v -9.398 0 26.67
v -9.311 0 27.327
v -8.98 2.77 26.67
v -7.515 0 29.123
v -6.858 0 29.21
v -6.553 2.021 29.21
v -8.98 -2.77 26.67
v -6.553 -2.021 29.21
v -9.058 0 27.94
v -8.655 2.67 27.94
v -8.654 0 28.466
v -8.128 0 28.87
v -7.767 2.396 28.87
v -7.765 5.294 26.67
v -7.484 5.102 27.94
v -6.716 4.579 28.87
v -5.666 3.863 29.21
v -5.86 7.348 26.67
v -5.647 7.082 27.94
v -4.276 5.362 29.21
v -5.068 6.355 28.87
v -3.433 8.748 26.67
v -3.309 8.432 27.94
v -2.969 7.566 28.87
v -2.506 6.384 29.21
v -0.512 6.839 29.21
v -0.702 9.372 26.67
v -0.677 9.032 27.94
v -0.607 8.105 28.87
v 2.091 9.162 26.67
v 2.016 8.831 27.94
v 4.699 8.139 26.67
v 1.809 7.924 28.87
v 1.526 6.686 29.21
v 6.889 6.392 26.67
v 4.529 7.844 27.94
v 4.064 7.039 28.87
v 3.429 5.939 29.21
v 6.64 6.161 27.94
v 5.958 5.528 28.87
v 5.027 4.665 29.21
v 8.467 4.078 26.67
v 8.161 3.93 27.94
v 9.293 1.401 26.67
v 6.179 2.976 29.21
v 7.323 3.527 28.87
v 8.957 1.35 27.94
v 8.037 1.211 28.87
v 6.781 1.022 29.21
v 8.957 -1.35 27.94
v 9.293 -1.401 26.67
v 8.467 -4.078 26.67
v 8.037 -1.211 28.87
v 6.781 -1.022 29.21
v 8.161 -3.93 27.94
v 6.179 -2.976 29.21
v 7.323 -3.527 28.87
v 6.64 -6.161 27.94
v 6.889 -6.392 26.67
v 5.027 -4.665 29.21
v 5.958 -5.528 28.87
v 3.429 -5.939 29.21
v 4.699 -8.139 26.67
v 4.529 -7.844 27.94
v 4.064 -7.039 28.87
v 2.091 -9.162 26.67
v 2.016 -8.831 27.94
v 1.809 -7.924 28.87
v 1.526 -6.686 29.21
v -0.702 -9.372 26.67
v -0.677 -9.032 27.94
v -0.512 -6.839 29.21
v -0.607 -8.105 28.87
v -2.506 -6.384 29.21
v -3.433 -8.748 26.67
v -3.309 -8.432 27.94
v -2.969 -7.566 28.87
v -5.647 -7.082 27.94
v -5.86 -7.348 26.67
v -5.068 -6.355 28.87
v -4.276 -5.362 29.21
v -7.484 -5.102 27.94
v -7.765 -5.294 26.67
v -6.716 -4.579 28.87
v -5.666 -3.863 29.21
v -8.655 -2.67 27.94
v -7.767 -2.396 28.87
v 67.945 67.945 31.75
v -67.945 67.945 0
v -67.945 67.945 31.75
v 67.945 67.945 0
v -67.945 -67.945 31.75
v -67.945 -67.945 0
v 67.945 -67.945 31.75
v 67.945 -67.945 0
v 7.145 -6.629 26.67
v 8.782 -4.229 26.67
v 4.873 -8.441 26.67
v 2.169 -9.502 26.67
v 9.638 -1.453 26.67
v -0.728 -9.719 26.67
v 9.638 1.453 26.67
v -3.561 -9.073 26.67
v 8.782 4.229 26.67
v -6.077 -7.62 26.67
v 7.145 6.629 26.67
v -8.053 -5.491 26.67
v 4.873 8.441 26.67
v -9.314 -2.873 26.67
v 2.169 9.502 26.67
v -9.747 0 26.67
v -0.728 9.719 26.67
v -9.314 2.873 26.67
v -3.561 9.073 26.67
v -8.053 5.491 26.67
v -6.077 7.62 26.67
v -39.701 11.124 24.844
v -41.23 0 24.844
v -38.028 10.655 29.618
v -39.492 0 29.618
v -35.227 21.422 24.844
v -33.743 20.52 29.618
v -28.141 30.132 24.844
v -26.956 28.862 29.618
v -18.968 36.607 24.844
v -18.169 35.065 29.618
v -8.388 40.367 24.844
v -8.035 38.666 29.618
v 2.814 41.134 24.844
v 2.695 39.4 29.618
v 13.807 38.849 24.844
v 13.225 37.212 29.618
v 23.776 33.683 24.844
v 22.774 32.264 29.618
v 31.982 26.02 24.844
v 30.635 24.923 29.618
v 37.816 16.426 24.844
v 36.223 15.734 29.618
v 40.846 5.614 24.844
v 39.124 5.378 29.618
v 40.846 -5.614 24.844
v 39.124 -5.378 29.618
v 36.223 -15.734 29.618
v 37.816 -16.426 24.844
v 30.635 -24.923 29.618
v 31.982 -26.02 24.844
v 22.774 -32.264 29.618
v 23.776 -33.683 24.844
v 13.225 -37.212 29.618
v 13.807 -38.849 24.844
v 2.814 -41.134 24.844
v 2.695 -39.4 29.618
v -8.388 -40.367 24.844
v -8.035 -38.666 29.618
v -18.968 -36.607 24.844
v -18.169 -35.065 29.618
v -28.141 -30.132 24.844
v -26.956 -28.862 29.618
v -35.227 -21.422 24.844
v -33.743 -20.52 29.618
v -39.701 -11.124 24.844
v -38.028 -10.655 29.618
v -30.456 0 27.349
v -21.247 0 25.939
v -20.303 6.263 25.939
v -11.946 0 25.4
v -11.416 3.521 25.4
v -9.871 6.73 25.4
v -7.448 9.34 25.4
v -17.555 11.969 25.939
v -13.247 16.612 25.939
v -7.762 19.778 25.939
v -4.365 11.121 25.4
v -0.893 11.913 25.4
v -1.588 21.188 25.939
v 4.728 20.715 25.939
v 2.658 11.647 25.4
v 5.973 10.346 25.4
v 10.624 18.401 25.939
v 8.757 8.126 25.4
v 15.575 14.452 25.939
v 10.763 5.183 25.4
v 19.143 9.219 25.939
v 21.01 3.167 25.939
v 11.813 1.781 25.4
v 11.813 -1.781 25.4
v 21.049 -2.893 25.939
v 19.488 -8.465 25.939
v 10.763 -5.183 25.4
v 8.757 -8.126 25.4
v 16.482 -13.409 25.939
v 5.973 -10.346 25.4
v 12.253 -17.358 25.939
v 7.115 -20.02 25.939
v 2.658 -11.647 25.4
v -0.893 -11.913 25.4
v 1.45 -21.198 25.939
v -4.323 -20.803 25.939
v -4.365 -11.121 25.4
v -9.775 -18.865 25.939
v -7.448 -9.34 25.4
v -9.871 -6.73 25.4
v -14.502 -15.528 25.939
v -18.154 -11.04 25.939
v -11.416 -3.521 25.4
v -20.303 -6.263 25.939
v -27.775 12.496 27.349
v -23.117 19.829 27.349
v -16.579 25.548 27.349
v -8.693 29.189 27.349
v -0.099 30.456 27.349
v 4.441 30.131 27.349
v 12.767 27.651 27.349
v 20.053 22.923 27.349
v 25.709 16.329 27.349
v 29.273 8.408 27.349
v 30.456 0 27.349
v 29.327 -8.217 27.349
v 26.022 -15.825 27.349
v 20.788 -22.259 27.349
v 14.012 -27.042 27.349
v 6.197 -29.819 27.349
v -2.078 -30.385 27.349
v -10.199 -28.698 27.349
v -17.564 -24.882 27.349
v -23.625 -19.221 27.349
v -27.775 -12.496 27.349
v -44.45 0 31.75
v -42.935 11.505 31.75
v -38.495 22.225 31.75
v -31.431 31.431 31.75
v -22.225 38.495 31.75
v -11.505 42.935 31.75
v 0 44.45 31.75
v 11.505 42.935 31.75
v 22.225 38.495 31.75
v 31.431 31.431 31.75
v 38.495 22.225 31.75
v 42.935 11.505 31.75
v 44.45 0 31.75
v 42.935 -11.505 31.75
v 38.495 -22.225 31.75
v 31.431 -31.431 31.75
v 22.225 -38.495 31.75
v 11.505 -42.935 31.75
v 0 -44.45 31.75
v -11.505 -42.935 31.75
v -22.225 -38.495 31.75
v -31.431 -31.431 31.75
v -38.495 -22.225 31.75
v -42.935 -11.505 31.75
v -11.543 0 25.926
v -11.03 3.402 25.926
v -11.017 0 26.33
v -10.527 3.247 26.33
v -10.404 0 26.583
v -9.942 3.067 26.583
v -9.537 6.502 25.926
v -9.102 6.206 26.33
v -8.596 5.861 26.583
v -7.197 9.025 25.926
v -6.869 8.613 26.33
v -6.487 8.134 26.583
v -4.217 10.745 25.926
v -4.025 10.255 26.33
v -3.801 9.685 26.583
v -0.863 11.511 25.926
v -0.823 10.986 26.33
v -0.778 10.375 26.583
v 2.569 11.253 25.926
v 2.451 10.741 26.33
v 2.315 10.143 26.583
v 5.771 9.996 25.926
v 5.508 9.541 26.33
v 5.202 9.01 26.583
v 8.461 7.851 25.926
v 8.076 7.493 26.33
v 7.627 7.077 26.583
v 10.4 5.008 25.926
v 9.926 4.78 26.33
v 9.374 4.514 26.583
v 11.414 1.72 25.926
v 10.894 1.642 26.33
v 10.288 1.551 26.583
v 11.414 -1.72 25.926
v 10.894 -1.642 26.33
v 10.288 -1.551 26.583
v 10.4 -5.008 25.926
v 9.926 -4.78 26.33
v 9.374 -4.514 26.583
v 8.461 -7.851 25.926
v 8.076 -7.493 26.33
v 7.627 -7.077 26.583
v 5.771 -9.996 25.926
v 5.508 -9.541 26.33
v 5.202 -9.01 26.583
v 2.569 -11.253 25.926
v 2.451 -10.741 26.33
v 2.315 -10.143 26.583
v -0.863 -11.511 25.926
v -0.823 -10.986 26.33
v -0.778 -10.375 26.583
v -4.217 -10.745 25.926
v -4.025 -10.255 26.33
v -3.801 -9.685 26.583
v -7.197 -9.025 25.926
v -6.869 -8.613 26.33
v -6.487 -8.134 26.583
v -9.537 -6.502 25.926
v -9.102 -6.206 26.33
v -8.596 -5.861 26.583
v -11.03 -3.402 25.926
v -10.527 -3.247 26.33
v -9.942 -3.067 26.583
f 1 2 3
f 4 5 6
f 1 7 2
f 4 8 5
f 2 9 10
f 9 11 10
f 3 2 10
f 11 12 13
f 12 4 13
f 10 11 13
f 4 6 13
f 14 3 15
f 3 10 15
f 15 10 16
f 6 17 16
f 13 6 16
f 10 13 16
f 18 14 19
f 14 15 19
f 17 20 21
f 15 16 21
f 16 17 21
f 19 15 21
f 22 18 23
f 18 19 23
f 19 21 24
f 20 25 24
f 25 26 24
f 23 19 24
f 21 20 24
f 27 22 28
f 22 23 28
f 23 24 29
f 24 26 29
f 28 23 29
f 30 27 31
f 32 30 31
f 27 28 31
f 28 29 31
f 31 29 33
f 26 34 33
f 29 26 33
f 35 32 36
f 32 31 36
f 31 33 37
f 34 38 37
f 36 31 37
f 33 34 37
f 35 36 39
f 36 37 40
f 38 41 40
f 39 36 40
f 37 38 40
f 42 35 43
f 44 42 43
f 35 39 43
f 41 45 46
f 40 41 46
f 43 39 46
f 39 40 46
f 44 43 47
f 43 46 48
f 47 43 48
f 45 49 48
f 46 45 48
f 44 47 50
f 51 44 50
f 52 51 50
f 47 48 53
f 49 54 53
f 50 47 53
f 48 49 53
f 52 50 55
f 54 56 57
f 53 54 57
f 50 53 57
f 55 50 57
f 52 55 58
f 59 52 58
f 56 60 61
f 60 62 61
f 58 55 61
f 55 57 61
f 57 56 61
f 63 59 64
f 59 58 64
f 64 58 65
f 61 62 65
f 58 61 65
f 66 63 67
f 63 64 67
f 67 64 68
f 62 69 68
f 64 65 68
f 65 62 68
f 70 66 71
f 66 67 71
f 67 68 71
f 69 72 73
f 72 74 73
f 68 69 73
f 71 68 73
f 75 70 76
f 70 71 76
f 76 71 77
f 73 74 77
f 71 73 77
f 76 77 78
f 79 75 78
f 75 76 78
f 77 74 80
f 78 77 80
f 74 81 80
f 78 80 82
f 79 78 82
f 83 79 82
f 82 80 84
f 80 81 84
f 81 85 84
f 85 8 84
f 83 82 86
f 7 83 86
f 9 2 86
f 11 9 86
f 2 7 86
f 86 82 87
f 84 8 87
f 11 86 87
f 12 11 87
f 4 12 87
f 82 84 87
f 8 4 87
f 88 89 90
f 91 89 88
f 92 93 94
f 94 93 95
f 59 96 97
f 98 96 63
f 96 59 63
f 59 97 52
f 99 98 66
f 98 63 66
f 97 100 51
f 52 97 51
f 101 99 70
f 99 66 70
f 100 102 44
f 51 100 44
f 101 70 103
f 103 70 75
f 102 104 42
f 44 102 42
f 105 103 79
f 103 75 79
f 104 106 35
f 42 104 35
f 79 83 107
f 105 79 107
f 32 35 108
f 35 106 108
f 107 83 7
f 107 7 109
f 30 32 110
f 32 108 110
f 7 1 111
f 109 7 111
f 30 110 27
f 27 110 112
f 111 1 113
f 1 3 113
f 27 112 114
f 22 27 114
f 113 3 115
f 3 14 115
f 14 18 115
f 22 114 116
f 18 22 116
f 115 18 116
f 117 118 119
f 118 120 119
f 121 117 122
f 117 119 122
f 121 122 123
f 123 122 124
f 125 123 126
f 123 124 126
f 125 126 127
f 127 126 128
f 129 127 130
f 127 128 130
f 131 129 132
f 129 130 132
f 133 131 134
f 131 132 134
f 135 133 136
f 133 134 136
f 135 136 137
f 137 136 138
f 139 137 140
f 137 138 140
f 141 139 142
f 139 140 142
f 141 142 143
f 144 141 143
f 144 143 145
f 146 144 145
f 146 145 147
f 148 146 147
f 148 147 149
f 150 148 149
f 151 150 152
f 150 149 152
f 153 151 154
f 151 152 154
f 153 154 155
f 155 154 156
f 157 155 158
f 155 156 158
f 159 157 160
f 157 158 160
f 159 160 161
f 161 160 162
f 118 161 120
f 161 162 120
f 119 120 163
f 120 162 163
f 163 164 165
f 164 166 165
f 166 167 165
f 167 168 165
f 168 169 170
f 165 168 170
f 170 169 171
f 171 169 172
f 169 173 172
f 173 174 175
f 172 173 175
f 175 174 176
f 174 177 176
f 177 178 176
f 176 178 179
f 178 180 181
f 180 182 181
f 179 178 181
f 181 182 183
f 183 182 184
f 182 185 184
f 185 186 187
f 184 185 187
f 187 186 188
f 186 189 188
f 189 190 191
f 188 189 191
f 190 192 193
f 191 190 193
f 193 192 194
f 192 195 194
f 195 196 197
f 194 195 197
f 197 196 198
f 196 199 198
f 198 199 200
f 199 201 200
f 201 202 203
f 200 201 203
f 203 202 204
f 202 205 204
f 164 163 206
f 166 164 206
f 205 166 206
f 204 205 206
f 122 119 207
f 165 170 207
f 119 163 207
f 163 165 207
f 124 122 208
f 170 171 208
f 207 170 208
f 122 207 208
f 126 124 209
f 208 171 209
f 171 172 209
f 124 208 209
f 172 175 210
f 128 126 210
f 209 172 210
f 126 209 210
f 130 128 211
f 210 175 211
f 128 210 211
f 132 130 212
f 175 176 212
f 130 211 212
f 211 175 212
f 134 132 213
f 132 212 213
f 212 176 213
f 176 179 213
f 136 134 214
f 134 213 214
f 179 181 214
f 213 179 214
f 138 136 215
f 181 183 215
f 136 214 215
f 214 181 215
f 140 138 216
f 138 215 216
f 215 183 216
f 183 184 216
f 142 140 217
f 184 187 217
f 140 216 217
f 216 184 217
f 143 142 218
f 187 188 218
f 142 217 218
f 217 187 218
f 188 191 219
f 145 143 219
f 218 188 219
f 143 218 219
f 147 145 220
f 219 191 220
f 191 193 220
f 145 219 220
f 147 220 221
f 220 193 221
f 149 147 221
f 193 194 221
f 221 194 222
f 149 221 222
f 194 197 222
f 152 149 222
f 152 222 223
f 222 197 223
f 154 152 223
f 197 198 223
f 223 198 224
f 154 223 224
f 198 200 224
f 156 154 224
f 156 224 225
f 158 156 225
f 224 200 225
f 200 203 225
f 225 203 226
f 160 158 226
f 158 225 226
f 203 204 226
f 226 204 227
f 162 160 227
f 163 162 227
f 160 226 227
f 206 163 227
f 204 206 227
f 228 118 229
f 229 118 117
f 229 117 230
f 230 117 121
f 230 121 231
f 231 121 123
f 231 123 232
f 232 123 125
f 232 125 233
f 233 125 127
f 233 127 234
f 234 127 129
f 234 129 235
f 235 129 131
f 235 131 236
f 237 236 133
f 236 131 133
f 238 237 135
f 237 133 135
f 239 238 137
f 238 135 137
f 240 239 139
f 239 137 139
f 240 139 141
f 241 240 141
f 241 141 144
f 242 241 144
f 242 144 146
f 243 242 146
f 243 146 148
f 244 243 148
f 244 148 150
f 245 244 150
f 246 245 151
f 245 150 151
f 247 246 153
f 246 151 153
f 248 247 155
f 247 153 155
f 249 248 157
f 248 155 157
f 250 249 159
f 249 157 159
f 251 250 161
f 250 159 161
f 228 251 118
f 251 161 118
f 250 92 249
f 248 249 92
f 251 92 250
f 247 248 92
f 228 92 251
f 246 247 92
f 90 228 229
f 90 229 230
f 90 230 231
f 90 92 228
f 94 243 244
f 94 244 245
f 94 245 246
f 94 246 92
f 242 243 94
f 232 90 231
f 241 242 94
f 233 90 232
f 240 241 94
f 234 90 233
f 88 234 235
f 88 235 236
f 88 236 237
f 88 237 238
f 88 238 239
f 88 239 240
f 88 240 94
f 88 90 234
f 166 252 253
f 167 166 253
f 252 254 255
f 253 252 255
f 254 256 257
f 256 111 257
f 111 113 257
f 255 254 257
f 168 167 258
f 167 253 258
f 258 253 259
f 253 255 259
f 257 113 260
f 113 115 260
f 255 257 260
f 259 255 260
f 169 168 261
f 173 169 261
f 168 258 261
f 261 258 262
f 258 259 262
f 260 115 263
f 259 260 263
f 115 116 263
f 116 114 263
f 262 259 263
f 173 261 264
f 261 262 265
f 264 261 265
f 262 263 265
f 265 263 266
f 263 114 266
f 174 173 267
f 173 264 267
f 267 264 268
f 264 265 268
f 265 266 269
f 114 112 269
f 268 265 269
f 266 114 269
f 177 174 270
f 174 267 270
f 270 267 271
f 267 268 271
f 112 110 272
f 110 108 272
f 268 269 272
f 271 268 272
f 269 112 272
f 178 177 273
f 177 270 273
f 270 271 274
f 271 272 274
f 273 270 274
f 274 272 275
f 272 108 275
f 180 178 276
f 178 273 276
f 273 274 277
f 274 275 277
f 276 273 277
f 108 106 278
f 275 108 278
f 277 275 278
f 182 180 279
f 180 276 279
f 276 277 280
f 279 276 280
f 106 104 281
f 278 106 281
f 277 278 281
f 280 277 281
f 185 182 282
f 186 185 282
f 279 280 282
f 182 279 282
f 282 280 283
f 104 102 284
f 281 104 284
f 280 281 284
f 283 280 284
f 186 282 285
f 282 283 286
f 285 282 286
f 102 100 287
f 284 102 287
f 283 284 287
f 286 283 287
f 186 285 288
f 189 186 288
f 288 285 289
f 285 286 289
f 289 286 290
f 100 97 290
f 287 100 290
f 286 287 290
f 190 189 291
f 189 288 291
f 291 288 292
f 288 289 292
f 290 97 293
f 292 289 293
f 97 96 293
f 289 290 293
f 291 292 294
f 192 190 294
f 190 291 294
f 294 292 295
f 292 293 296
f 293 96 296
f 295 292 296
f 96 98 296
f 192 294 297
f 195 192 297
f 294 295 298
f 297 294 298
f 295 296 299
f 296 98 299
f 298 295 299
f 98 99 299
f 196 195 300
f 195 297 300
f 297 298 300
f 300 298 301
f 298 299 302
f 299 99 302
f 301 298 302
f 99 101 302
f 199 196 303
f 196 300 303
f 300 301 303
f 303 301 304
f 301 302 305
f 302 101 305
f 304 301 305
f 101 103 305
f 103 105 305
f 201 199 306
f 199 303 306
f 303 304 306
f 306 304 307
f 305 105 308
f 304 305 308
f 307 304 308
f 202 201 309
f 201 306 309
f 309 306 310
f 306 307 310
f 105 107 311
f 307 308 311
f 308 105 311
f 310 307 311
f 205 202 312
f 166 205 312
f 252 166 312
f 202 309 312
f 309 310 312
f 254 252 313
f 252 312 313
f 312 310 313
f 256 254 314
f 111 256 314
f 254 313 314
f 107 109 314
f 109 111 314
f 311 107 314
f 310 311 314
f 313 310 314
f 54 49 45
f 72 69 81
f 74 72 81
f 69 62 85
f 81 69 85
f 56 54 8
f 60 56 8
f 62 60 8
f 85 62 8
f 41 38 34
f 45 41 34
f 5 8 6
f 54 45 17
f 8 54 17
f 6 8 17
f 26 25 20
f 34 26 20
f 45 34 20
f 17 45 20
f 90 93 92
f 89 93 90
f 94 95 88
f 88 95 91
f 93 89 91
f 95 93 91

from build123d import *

# Parameters (mm, degrees)
F0_W     = 135.89
F0_H     = 135.89
F1_DEPTH = 31.75


# Not quite as in the source:
# - a fillet or chamfer that OpenCascade refuses, or shapes differently, is made with other operations: its cross-section is extruded or revolved along the edge and cut away or added


with BuildPart() as f1:
    # F0 (on Top) → F1 (new body)
    with BuildSketch(Plane.XY):
        Rectangle(F0_W, F0_H)
    extrude(amount=F1_DEPTH)

    # F2 (on Front) → F3 (revolve, cut)
    with BuildSketch(Plane.XZ):
        with BuildLine():
            Line((0, 29.21), (0, 31.75))
            Line((0, 31.75), (-44.45, 31.75))
            Line((-44.45, 31.75), (-41.2296488455, 24.8439346628))
            Line((-41.2296488455, 24.8439346628), (-39.4921865174, 29.6175731764))
            ThreePointArc((-39.4921865174, 29.6175731764), (-25.8683470518, 26.5354678002), (-11.9464546442, 25.4))
            Line((-11.9464546442, 25.4), (-11.9464546442, 26.67))
            Line((-11.9464546442, 26.67), (-9.398, 26.67))
            Line((-9.398, 26.67), (-9.398, 29.21))
            Line((-9.398, 29.21), (0, 29.21))
        make_face()
    revolve(axis=Axis((0, 0, 21.6028230067), (0, 0, -1)), mode=Mode.SUBTRACT)

    # F4: fillet of radius 2.54 on 2 edges, made by hand

    # F4_s1 → F4_t2 (revolve, cut)
    with BuildSketch(Plane.XZ):
        with BuildLine():
            ThreePointArc((-9.398, 26.67), (-8.6540512242, 28.4660512242), (-6.858, 29.21))
            Line((-6.858, 29.21), (-9.398, 29.21))
            Line((-9.398, 29.21), (-9.398, 26.67))
        make_face()
    revolve(axis=Axis((0, 0, 29.21), (0, 0, -1)), mode=Mode.SUBTRACT)

    # F4_s3 → F4_t4 (revolve, cut)
    with BuildSketch(Plane.XZ):
        with BuildLine():
            ThreePointArc((-11.9464546442, 25.4), (-11.0167501186, 26.3297045256), (-9.7467501186, 26.67))
            Line((-9.7467501186, 26.67), (-11.9464546442, 26.67))
            Line((-11.9464546442, 26.67), (-11.9464546442, 25.4))
        make_face()
    revolve(axis=Axis((0, 0, 26.67), (0, 0, -1)), mode=Mode.SUBTRACT)


solid = f1.part
